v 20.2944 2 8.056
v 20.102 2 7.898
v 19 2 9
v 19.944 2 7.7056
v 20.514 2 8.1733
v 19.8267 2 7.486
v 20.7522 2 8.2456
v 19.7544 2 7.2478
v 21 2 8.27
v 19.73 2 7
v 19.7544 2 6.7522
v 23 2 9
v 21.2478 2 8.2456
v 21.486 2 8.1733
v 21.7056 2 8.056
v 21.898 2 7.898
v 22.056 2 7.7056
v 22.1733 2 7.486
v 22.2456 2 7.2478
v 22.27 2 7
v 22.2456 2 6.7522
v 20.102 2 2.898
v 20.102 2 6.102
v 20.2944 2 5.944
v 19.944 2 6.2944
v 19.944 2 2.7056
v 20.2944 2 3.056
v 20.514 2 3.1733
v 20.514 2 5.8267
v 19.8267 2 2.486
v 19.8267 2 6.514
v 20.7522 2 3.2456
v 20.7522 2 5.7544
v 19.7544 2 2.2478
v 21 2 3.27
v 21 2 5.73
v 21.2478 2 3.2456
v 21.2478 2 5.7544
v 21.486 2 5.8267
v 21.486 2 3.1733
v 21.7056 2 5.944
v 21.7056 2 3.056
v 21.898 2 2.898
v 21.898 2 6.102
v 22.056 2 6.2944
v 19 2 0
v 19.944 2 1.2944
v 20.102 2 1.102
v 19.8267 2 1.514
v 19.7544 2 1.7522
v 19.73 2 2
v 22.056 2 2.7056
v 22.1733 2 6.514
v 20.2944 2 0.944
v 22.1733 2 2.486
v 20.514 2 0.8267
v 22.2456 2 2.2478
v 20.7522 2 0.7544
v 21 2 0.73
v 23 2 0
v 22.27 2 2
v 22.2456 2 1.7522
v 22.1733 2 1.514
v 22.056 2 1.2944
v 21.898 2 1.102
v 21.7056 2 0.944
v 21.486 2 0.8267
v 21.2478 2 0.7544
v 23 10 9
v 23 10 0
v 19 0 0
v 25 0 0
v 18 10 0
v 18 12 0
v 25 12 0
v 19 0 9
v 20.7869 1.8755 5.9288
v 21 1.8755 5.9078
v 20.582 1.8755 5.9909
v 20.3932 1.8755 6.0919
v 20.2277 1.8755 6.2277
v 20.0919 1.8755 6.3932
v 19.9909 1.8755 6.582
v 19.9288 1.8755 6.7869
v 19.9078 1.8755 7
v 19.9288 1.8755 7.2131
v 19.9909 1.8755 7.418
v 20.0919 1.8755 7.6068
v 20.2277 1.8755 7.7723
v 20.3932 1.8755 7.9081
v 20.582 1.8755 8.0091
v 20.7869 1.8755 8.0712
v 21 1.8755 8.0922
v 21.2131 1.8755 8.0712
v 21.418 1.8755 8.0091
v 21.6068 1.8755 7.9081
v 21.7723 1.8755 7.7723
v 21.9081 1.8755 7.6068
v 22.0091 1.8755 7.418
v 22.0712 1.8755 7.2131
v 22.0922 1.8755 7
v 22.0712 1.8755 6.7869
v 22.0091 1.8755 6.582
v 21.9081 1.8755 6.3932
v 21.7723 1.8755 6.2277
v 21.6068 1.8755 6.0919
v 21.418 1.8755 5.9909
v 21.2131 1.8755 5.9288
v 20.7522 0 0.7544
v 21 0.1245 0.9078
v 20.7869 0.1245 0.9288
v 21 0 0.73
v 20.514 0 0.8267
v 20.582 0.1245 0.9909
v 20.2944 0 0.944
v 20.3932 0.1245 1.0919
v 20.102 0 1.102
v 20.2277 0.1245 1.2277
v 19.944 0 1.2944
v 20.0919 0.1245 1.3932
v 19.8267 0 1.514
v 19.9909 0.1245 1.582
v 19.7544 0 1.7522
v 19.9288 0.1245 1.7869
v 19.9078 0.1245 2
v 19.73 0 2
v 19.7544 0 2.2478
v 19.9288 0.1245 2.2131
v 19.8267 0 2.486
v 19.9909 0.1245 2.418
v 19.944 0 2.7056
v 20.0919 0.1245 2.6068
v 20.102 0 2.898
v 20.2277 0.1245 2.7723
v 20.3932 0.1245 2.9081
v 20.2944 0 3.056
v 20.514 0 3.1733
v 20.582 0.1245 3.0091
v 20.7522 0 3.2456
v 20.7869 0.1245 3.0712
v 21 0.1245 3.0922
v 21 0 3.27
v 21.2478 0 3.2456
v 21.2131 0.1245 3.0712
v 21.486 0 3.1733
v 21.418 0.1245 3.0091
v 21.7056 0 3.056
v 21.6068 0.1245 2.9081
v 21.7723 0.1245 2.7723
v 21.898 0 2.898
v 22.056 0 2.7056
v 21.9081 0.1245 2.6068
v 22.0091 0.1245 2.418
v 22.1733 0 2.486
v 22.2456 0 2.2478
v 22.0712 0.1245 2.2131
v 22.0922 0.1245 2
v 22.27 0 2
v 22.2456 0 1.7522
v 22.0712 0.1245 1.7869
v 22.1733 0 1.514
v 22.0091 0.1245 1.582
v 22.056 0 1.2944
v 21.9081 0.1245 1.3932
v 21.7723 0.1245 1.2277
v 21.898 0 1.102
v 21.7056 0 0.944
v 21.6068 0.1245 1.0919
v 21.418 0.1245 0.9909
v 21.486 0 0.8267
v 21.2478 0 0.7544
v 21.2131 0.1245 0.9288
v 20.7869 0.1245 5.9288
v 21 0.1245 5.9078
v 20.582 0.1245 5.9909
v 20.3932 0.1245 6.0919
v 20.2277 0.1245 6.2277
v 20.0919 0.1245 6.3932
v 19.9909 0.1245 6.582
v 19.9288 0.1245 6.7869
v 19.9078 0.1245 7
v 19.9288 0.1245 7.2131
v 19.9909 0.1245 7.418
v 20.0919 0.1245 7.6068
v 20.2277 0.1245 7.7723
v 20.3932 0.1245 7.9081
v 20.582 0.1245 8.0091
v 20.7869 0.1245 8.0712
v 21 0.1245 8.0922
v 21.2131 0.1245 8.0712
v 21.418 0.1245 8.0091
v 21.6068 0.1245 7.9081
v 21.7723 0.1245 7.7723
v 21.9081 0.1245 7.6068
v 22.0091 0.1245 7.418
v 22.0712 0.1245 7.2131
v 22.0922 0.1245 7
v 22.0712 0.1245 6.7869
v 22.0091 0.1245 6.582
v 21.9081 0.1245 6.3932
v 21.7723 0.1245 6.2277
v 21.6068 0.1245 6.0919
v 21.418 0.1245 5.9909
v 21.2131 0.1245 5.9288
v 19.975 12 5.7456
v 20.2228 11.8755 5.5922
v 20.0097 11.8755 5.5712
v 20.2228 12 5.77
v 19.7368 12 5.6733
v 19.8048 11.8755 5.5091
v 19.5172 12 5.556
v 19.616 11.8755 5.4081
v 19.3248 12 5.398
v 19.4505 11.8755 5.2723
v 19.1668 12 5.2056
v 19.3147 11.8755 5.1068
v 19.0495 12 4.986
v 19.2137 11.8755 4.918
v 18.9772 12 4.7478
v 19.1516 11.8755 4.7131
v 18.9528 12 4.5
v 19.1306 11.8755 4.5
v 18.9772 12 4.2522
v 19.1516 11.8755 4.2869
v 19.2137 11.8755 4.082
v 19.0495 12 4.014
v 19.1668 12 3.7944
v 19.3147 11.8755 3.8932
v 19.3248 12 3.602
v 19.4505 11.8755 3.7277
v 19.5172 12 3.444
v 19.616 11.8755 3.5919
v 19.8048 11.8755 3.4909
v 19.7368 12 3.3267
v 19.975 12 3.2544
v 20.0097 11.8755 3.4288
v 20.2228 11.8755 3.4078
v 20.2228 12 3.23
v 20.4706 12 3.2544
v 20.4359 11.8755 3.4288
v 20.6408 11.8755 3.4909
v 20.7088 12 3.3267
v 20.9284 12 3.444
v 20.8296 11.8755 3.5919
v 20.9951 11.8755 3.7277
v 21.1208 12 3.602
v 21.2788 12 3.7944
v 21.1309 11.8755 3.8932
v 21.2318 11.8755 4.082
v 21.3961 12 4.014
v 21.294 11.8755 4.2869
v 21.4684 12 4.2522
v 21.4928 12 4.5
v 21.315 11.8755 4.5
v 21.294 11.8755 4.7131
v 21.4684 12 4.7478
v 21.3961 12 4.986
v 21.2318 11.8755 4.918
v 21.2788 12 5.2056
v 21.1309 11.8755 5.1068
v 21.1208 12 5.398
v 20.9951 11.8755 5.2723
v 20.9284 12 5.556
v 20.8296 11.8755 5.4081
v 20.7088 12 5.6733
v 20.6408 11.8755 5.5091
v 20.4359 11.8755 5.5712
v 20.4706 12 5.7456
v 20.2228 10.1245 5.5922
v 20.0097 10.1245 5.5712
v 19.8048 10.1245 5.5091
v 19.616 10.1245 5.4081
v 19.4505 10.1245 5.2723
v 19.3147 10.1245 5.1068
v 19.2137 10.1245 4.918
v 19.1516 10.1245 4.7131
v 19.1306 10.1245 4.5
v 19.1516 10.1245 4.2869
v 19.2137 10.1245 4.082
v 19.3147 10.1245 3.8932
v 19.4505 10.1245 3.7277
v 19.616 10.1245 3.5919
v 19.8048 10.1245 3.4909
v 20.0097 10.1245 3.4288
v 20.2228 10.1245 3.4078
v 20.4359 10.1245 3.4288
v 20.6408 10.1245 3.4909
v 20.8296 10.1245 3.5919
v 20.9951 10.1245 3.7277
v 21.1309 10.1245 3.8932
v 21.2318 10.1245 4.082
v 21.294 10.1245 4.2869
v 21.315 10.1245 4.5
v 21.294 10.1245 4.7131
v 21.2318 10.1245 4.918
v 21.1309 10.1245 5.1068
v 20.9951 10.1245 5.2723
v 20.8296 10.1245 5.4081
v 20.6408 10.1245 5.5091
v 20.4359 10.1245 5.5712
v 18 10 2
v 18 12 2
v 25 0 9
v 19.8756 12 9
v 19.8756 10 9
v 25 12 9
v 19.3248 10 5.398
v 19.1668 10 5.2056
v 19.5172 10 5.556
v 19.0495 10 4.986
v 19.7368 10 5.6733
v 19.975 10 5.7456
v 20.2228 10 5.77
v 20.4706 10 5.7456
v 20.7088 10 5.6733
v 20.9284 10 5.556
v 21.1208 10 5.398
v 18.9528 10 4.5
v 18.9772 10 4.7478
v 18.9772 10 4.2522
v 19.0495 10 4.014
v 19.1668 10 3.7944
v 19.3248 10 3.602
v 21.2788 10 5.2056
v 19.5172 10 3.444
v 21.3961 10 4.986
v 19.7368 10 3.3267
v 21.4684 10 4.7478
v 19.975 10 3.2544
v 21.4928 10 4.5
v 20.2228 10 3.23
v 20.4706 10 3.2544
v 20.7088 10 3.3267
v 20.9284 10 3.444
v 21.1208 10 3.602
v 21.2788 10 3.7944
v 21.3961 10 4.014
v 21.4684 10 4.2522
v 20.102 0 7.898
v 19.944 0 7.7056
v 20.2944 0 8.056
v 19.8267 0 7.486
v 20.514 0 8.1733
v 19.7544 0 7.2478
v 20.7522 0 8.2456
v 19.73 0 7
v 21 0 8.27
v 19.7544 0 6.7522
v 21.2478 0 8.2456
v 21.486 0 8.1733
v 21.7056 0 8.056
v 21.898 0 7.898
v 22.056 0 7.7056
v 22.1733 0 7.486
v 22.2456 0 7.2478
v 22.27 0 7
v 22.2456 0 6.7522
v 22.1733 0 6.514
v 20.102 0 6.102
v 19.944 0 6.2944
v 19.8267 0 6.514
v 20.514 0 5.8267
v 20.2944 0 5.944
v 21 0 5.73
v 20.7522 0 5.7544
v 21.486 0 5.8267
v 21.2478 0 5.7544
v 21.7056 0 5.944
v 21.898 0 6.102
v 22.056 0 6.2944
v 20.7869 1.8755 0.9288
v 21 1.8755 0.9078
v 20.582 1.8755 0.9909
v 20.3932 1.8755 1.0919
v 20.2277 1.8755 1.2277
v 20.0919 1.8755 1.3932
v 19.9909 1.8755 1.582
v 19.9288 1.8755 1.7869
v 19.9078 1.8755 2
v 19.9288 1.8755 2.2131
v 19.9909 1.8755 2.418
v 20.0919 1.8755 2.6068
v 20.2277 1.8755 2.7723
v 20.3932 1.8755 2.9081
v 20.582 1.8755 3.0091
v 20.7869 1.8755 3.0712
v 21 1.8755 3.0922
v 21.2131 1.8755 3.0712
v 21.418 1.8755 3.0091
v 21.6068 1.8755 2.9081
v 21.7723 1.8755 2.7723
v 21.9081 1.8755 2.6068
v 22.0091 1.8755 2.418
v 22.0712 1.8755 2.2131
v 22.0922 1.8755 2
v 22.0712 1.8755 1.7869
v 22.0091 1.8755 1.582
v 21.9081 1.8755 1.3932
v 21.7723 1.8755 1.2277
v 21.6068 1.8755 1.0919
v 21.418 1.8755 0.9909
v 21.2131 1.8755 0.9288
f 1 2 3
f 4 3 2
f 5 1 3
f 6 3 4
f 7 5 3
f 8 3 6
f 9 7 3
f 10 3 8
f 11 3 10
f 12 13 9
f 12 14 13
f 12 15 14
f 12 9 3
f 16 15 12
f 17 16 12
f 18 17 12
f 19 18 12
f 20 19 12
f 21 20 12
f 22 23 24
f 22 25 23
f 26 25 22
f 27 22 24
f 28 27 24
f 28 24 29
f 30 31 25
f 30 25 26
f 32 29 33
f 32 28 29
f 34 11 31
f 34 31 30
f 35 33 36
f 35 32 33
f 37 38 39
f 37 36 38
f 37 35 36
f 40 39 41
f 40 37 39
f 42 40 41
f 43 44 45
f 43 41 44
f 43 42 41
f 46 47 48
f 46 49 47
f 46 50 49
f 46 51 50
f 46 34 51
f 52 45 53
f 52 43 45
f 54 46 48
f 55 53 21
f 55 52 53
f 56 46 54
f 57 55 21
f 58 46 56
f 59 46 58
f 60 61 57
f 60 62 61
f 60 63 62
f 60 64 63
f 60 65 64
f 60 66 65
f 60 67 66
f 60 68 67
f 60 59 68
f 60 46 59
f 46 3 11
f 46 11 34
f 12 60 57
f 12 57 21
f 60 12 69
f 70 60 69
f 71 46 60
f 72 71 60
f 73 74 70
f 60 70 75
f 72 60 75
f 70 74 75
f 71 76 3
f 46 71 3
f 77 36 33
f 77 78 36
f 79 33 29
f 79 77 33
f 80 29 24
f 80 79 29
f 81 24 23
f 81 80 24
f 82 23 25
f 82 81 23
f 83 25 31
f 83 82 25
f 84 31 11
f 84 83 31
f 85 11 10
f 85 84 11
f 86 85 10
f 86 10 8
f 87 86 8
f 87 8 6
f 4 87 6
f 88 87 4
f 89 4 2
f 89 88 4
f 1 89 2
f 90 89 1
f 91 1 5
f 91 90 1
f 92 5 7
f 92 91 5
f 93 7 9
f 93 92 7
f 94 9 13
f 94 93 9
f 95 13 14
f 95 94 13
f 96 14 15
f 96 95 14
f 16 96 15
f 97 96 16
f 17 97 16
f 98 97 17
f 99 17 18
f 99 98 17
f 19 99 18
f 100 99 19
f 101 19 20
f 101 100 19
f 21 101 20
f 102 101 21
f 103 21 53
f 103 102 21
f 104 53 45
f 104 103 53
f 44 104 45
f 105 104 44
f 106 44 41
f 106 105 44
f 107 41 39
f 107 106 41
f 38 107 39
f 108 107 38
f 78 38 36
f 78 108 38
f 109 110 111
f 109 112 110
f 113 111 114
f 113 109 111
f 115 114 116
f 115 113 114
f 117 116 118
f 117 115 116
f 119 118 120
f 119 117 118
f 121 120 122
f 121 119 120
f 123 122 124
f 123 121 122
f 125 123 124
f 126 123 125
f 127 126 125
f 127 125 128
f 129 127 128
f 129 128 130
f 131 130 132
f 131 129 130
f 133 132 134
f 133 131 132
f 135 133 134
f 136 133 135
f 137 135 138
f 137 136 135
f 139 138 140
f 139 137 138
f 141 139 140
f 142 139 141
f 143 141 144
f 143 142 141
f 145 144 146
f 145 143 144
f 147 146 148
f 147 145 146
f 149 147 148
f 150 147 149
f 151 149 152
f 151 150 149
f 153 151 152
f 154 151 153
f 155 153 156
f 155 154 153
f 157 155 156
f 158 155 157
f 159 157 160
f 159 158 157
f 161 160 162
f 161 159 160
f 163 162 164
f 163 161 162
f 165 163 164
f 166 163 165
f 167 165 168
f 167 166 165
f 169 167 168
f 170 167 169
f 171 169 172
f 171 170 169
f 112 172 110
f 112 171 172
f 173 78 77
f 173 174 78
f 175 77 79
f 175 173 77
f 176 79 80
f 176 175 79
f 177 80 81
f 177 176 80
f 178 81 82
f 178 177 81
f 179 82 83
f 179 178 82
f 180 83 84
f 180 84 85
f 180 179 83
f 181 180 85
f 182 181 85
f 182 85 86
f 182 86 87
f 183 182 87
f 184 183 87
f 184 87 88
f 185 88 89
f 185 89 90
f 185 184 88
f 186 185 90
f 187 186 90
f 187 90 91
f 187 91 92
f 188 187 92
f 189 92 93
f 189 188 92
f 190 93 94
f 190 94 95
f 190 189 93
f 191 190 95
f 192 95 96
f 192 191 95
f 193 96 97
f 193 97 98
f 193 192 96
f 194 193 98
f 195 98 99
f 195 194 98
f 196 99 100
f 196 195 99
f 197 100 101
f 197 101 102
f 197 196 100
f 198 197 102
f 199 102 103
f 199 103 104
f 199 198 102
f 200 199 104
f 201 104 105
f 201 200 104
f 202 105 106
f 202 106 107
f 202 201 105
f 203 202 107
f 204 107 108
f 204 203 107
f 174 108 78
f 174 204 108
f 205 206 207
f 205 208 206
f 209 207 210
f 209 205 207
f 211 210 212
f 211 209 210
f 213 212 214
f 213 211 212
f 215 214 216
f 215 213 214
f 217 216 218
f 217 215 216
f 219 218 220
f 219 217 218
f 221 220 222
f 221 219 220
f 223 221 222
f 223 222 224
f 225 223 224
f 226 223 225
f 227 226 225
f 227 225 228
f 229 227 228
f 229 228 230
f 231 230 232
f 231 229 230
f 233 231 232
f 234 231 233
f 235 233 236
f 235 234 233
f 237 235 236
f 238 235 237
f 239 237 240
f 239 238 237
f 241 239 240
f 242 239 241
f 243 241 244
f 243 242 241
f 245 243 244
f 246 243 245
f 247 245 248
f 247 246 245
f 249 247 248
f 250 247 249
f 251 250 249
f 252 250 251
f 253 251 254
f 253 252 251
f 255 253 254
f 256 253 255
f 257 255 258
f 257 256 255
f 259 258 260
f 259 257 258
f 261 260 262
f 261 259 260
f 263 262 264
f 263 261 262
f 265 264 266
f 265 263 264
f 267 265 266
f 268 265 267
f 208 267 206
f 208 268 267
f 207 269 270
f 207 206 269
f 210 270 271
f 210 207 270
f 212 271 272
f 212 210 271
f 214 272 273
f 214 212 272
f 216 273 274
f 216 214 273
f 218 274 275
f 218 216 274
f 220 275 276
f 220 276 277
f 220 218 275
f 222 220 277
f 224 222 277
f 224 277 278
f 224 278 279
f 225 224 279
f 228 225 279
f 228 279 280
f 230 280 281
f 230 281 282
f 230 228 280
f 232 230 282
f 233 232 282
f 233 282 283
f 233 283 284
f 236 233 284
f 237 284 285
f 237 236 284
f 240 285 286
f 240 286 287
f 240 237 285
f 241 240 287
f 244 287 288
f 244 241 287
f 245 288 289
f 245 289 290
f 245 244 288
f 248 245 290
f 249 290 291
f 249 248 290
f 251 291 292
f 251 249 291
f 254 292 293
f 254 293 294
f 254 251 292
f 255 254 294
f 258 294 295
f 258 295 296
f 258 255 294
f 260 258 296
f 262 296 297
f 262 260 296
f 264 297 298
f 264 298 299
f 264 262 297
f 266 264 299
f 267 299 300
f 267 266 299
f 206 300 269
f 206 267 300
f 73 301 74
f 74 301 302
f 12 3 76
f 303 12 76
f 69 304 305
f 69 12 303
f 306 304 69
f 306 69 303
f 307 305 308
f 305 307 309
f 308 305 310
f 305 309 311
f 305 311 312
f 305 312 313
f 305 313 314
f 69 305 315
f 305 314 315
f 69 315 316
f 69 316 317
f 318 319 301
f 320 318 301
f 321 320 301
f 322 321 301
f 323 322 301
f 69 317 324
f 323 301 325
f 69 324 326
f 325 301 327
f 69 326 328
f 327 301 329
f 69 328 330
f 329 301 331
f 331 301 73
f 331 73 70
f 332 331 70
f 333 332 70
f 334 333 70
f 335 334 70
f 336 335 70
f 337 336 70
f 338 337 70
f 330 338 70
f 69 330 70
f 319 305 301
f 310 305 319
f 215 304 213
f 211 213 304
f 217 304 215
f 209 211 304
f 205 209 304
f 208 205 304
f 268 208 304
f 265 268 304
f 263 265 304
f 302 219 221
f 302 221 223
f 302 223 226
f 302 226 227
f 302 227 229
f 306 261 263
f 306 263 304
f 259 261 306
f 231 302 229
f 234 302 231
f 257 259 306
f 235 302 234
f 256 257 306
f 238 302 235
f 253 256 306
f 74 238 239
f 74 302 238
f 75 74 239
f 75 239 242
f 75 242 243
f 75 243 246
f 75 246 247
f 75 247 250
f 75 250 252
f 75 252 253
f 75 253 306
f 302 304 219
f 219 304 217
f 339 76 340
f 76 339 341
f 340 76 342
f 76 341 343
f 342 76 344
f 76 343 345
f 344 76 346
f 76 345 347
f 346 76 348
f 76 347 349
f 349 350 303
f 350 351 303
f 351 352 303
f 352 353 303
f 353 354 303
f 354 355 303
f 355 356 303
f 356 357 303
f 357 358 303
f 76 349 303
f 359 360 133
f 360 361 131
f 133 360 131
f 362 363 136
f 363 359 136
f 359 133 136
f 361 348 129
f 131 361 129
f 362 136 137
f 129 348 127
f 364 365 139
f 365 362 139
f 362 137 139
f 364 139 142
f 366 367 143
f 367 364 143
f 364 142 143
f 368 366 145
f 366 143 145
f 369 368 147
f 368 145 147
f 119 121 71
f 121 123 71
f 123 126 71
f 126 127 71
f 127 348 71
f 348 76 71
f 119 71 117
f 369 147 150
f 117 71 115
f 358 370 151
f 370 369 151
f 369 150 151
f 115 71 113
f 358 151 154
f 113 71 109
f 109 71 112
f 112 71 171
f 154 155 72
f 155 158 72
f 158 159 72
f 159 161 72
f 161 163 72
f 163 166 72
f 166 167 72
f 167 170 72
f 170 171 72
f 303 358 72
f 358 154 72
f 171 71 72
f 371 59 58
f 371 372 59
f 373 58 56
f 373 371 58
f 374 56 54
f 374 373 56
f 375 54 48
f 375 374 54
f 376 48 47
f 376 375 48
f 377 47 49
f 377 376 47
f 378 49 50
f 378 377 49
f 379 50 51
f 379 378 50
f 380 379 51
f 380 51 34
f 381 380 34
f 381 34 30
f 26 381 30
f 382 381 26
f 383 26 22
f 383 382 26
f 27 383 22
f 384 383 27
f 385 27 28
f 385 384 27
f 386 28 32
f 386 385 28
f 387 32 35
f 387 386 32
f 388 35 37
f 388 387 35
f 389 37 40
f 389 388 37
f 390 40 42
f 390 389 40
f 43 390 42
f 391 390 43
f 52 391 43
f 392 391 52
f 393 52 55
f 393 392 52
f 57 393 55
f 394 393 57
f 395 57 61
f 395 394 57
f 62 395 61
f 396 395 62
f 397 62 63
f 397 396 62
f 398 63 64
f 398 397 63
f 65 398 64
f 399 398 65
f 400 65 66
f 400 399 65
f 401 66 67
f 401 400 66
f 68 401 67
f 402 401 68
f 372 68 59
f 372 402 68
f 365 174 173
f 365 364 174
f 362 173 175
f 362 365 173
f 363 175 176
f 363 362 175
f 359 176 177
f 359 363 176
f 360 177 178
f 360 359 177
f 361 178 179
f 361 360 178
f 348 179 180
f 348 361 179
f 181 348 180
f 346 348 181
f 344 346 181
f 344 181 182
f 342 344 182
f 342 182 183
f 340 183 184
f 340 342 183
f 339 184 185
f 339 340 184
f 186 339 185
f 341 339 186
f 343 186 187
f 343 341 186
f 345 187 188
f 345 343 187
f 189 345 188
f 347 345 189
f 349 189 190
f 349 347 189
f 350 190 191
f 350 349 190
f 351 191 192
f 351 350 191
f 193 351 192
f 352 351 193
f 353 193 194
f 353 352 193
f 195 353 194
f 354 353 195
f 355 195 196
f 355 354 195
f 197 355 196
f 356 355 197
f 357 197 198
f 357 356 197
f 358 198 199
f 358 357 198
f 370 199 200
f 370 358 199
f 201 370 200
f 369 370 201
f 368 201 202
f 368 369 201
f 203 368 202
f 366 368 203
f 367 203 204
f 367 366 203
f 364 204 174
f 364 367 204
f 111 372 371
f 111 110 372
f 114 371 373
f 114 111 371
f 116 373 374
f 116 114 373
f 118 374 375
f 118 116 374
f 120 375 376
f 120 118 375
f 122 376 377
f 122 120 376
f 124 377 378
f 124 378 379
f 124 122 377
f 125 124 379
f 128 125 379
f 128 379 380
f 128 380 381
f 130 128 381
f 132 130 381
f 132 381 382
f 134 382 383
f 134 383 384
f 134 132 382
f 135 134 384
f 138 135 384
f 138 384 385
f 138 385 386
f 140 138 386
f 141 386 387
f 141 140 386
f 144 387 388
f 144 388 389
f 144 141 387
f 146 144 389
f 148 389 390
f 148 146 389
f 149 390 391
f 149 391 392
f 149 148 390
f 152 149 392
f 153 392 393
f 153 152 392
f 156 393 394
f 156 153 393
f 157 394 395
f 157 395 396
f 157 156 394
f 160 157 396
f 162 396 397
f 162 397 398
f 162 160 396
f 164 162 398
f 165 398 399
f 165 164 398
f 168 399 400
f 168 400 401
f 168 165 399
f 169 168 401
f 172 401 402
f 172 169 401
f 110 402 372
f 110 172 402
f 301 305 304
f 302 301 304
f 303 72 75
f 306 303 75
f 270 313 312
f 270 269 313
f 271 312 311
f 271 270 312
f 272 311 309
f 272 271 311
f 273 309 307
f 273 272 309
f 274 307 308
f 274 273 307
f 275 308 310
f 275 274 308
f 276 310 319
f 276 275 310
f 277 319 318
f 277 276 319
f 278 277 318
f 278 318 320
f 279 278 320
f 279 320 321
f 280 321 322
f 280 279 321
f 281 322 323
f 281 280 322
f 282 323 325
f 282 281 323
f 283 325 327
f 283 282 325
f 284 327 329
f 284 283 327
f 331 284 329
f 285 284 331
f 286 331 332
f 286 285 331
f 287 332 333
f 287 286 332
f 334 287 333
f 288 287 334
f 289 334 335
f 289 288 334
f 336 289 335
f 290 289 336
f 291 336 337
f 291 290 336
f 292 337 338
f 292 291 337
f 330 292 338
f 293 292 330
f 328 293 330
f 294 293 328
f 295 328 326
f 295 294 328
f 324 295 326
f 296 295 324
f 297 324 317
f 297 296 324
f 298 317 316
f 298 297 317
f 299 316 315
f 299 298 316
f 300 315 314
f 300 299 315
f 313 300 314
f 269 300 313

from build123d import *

# Parameters (mm, degrees)
SKETCH_1_W                   = 25
SKETCH_1_H                   = 12
SKETCH_1_W_2                 = 21
SKETCH_1_H_2                 = 8
EXTRUDE_1_DEPTH              = 9
CUT_EXTRUDE_1_DEPTH          = 10
CHAMFER_1_SIZE               = 7
CHAMFER_1_SIZE2              = 1.875644347
HOLE_WIZARD_2_561_AT_2_COUNT = 2
HOLE_WIZARD_2_561_AT_2_PITCH = 5


with BuildPart() as part:
    # Эскиз1 → Бобышка-Вытянуть1 (new body)
    with BuildSketch(Plane.XY):
        with Locations((12.5, 6)):
            Rectangle(SKETCH_1_W, SKETCH_1_H)
        with Locations((12.5, 6)):
            Rectangle(SKETCH_1_W_2, SKETCH_1_H_2, mode=Mode.SUBTRACT)
    extrude(amount=EXTRUDE_1_DEPTH)

    # Эскиз2 → Вырез-Вытянуть1 (cut, through all)
    with BuildSketch(Plane.XY.offset(9)):
        Polygon((18, 10), (18, 12), (0, 12), (0, 0), (19, 0), (19, 2), (2, 2), (2, 10), align=None)
    extrude(amount=-CUT_EXTRUDE_1_DEPTH, mode=Mode.SUBTRACT)

    # Фаска1
    chamfer_1_edges = [part.edges().sort_by_distance(p)[0] for p in [
        (18, 11, 9),
    ]]
    chamfer_1_side = [part.faces().sort_by_distance(p)[0] for p in [
        (18, 11, 4.5),
    ]]
    chamfer(chamfer_1_edges, length=CHAMFER_1_SIZE, length2=CHAMFER_1_SIZE2, reference=chamfer_1_side[0])

    # Эскиз5 → Отверстие обработанное метчиком #2-561 (revolve, cut)
    with BuildSketch(Plane(origin=(21, 0, 2), x_dir=(0, 0, -1), z_dir=(1, 0, 0))):
        Polygon((0, 0), (0, 2), (1.27, 2), (1.0922, 1.8755031), (1.0922, 0.1244969), (1.27, 0), align=None)
    hole_wizard_2_561 = revolve(axis=Axis((21, -6.35, 2), (0, 1, 0)), mode=Mode.SUBTRACT)

    # Отверстие обработанное метчиком #2-561 at 2: Отверстие обработанное метчиком #2-561 ×2
    with Locations(*[(0, 0, i * HOLE_WIZARD_2_561_AT_2_PITCH) for i in range(1, HOLE_WIZARD_2_561_AT_2_COUNT)]):
        add(hole_wizard_2_561, mode=Mode.SUBTRACT)

    # Эскиз6 → Отверстие обработанное метчиком #2-562 (revolve, cut)
    with BuildSketch(Plane(origin=(20.222787252, 12, 4.5), x_dir=(0, 0, 1), z_dir=(1, 0, 0))):
        Polygon((0, 0), (0, 2), (1.27, 2), (1.0922, 1.8755031), (1.0922, 0.1244969), (1.27, 0), align=None)
    revolve(axis=Axis((20.222787252, 18.35, 4.5), (0, -1, 0)), mode=Mode.SUBTRACT)


solid = part.part
